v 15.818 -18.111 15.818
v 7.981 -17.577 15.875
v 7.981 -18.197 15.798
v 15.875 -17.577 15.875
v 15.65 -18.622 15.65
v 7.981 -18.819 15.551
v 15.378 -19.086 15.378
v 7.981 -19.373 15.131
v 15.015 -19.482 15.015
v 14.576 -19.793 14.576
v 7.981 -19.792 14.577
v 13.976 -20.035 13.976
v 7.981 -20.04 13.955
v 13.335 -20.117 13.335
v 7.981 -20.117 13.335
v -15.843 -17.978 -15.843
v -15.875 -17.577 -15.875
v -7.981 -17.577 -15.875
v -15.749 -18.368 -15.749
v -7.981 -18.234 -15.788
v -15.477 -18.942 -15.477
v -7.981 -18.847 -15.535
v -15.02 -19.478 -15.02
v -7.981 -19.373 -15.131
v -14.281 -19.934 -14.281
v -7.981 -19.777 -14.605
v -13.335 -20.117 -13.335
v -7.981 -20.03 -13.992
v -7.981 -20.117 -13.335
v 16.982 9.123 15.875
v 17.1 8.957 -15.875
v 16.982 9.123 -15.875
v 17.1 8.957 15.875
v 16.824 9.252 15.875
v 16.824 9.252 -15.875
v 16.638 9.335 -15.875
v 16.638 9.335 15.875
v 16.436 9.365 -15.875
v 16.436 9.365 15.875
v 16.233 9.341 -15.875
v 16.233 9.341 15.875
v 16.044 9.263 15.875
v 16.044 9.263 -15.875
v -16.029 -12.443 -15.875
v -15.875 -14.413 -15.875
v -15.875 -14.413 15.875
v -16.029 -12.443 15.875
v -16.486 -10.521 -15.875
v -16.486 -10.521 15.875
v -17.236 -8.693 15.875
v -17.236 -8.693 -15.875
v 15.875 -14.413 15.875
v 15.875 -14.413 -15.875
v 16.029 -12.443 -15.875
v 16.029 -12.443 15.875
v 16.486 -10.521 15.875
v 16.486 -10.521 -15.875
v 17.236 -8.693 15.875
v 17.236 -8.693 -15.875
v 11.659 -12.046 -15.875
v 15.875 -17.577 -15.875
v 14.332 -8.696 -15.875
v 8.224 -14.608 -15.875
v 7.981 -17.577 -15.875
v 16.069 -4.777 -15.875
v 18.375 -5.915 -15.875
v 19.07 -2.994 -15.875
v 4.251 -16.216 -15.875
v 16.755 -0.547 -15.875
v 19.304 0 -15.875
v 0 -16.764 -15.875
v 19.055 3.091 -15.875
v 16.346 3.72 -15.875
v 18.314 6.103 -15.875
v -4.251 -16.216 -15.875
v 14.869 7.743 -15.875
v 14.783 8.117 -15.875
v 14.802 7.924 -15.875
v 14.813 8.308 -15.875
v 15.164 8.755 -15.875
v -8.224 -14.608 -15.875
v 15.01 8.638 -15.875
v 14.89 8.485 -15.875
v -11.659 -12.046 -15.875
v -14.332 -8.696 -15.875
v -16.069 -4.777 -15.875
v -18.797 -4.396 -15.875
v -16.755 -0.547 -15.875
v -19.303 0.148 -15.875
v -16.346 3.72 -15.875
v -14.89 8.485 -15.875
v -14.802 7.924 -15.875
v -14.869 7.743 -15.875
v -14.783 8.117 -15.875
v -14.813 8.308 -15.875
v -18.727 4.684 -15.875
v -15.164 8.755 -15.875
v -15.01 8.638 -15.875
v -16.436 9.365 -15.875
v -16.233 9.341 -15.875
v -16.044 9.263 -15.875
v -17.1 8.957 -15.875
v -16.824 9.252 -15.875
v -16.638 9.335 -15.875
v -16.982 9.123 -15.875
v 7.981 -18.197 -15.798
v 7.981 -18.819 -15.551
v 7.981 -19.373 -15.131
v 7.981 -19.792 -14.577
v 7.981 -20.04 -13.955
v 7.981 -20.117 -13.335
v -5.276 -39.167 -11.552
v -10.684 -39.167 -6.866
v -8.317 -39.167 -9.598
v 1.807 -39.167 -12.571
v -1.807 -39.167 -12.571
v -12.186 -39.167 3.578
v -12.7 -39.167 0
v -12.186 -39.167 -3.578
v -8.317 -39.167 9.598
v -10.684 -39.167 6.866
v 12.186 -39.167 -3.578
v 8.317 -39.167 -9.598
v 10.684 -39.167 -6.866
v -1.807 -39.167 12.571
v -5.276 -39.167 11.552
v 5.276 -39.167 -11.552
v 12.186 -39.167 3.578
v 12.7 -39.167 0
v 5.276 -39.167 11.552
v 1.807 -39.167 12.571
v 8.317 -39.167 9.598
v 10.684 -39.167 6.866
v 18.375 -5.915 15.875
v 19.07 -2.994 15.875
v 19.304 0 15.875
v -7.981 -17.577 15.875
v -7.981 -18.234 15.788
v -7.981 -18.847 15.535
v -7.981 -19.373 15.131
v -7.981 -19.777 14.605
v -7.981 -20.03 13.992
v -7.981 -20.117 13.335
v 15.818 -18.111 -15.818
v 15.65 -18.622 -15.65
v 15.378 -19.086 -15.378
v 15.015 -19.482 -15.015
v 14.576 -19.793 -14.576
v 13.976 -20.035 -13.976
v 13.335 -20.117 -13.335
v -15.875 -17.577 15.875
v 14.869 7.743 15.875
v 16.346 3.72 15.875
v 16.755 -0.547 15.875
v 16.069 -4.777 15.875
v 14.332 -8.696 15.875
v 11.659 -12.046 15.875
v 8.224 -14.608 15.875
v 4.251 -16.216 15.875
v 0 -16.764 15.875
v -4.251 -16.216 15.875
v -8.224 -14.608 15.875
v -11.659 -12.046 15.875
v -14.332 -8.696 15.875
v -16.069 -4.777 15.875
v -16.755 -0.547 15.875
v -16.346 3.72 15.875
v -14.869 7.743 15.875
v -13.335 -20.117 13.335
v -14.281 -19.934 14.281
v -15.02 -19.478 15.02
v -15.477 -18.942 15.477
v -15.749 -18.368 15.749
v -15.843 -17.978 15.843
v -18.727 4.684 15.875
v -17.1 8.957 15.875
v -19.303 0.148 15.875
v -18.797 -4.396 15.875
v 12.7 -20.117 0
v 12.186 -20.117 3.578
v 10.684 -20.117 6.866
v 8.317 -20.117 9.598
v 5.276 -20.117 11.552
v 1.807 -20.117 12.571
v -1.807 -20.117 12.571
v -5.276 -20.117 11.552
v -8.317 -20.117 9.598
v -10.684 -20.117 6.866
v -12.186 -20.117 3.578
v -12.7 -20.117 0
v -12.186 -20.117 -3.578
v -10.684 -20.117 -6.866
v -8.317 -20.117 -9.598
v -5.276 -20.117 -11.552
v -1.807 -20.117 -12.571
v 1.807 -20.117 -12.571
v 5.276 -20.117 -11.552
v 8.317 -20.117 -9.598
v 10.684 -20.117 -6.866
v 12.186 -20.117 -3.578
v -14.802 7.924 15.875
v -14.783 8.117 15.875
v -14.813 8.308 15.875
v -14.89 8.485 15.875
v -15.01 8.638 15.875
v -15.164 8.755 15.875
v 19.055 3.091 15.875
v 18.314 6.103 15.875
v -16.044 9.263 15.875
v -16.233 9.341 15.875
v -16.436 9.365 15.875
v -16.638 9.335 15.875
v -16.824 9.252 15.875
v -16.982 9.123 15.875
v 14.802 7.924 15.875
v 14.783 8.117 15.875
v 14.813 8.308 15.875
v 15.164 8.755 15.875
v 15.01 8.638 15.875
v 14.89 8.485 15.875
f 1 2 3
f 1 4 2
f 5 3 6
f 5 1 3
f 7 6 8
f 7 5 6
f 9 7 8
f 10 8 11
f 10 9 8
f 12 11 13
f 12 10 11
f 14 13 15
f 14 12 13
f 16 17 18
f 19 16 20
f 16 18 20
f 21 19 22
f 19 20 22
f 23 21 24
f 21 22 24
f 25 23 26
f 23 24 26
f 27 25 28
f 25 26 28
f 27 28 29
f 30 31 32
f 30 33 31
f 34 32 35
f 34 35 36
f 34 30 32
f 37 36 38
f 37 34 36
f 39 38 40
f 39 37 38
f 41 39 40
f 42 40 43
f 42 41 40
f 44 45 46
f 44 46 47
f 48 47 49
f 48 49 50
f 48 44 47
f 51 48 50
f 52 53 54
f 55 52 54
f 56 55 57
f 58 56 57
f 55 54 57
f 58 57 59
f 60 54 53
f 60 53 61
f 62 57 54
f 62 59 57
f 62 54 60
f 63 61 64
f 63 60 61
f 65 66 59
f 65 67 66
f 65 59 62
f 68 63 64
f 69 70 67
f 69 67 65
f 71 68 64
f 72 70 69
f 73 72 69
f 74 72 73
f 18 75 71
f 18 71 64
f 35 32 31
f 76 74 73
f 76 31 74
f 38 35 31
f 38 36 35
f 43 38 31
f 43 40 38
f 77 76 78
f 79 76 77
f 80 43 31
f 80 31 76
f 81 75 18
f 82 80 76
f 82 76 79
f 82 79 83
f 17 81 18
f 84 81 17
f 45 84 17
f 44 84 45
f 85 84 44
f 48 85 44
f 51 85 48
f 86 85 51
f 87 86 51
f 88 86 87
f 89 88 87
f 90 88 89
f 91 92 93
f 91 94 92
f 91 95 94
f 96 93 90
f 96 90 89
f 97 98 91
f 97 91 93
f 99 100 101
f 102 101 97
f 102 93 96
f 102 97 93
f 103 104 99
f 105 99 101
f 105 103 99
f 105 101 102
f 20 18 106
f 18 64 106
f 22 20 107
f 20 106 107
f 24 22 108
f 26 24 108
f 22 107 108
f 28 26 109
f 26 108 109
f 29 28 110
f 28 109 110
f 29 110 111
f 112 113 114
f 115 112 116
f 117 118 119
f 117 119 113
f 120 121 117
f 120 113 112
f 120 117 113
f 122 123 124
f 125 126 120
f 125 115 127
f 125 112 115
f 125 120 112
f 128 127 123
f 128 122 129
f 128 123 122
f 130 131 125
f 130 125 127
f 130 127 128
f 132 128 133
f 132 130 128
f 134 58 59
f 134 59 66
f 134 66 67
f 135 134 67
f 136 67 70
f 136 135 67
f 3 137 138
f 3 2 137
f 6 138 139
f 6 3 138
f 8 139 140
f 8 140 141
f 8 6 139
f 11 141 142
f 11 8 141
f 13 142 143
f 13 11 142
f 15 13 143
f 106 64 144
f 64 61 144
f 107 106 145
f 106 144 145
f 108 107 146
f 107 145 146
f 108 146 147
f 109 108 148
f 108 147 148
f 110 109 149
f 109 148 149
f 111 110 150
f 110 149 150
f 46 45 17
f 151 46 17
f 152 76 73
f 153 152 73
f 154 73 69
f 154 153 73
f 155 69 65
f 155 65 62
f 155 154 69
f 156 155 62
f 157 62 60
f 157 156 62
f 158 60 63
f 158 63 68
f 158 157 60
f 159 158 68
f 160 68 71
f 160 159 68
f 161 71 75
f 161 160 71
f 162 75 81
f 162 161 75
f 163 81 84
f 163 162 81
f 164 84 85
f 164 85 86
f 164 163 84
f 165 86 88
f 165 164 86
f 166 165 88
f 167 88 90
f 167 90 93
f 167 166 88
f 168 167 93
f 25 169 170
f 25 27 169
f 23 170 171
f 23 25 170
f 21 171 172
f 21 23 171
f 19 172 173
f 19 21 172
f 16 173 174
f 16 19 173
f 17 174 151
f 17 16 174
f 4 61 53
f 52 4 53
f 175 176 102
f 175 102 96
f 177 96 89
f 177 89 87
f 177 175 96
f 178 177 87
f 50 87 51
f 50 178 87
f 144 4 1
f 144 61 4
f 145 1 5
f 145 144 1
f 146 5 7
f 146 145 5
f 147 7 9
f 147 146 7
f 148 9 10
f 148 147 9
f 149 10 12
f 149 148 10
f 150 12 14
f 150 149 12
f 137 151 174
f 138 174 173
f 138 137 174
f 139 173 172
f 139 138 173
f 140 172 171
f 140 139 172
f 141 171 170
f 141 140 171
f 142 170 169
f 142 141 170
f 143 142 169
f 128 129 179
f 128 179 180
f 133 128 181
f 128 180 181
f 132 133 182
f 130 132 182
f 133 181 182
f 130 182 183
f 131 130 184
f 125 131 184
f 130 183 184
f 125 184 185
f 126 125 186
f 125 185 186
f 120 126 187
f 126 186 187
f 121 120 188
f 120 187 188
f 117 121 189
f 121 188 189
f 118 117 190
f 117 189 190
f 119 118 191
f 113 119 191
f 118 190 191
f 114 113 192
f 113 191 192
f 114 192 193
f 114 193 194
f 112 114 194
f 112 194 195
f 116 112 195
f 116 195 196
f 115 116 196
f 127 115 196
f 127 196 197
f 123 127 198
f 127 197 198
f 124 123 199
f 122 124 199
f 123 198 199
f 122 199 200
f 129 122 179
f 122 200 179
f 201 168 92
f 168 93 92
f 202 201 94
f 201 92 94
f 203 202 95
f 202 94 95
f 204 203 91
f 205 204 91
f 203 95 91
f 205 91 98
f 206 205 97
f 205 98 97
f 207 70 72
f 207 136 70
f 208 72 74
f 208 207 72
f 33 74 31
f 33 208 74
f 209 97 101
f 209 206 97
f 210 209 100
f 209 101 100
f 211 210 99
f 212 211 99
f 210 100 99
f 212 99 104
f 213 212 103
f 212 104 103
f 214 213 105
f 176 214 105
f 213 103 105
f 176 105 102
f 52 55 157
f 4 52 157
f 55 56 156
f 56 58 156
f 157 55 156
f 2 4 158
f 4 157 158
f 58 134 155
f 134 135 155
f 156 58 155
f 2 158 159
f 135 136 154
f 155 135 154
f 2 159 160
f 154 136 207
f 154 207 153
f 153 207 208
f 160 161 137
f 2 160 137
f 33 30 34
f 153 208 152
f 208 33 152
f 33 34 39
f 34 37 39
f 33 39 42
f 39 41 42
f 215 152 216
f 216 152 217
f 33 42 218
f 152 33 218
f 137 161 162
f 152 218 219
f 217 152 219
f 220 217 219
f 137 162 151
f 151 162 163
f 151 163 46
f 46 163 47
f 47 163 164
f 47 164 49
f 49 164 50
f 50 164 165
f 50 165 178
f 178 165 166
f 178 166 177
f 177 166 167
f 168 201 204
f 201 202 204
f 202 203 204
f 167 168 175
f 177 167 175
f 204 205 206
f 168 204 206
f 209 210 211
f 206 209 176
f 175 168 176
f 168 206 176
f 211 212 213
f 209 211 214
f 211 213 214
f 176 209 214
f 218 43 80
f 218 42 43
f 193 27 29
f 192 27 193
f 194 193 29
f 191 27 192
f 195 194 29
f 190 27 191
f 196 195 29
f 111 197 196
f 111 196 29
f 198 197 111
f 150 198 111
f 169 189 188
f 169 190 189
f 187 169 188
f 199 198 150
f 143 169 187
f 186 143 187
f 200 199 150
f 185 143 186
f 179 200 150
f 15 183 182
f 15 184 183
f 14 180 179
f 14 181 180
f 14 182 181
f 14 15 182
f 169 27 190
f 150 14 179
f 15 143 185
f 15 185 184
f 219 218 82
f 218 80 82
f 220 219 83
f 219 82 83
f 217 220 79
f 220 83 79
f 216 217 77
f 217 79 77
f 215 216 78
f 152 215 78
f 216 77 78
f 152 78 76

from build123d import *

# Parameters (mm, degrees)
F1_DEPTH    = 15.875
F2_DEPTH    = 15.875
F3_R        = 12.7
F4_DEPTH    = 19.05
F5_R        = 2.54
F6_T1_DEPTH = 31.75
F7_R        = 0.762


# Not quite as in the source:
# - a fillet or chamfer that OpenCascade refuses, or shapes differently, is made with other operations: its cross-section is extruded or revolved along the edge and cut away or added


with BuildPart() as f1:
    # F0 (on Top) → F1 (new body, symmetric)
    with BuildSketch(Plane.XY):
        with BuildLine():
            ThreePointArc((15.875, -10.9831139027), (18.4268203443, -5.7529738397), (19.304, 0))
            ThreePointArc((19.304, 0), (18.6462321507, 4.9962428467), (16.7177543947, 9.652))
            Line((16.7177543947, 9.652), (14.518049869, 8.382))
            ThreePointArc((14.518049869, 8.382), (16.1927805519, 4.3388424721), (16.764, 0))
            ThreePointArc((16.764, 0), (-4.3388424721, -16.1927805519), (-14.518049869, 8.382))
            Line((-14.518049869, 8.382), (-16.7177543947, 9.652))
            ThreePointArc((-16.7177543947, 9.652), (-19.2879208626, -0.7877339639), (-15.875, -10.9831139027))
            ThreePointArc((-15.875, -10.9831139027), (0, -19.304), (15.875, -10.9831139027))
        make_face()
    extrude(amount=F1_DEPTH, both=True)

    # F0 (on Top) → F2 (join, symmetric)
    with BuildSketch(Plane.XY):
        with BuildLine():
            Line((15.875, -20.1168), (15.875, -10.9831139027))
            ThreePointArc((15.875, -10.9831139027), (0, -19.304), (-15.875, -10.9831139027))
            Line((-15.875, -10.9831139027), (-15.875, -20.1168))
            Line((-15.875, -20.1168), (15.875, -20.1168))
        make_face()
    extrude(amount=F2_DEPTH, both=True)

    # F3 (on face) → F4 (join)
    with BuildSketch(Plane.XZ.offset(20.1168)):
        Circle(F3_R)
    extrude(amount=F4_DEPTH)

    # F5
    f5_edges = [f1.edges().sort_by_distance(p)[0] for p in [
        (-15.875, -20.1168, 0),
        (15.875, -20.1168, 0),
        (0, -20.1168, 15.875),
        (0, -20.1168, -15.875),
    ]]
    fillet(f5_edges, radius=F5_R)

    # F6: fillet of radius 12.7 on 2 edges, made by hand

    # F6_s2 → F6_t1 (join)
    with BuildSketch(Plane.XY.offset(-15.875)):
        with BuildLine():
            ThreePointArc((-15.875, -14.4126816034), (-16.2198608148, -11.4732027866), (-17.2357142857, -8.6933635068))
            ThreePointArc((-17.2357142857, -8.6933635068), (-16.594896485, -9.8617354788), (-15.875, -10.9831139027))
            Line((-15.875, -10.9831139027), (-15.875, -14.4126816034))
        make_face()
        with BuildLine():
            ThreePointArc((15.875, -14.4126816034), (16.2198608148, -11.4732027866), (17.2357142857, -8.6933635068))
            ThreePointArc((17.2357142857, -8.6933635068), (16.594896485, -9.8617354788), (15.875, -10.9831139027))
            Line((15.875, -10.9831139027), (15.875, -14.4126816034))
        make_face()
    extrude(amount=F6_T1_DEPTH)

    # F7
    f7_edges = [f1.edges().sort_by_distance(p)[0] for p in [
        (-16.717754, 9.652, 0),
        (-14.51805, 8.382, 0),
        (16.717754, 9.652, 0),
        (14.51805, 8.382, 0),
    ]]
    fillet(f7_edges, radius=F7_R)


solid = f1.part
